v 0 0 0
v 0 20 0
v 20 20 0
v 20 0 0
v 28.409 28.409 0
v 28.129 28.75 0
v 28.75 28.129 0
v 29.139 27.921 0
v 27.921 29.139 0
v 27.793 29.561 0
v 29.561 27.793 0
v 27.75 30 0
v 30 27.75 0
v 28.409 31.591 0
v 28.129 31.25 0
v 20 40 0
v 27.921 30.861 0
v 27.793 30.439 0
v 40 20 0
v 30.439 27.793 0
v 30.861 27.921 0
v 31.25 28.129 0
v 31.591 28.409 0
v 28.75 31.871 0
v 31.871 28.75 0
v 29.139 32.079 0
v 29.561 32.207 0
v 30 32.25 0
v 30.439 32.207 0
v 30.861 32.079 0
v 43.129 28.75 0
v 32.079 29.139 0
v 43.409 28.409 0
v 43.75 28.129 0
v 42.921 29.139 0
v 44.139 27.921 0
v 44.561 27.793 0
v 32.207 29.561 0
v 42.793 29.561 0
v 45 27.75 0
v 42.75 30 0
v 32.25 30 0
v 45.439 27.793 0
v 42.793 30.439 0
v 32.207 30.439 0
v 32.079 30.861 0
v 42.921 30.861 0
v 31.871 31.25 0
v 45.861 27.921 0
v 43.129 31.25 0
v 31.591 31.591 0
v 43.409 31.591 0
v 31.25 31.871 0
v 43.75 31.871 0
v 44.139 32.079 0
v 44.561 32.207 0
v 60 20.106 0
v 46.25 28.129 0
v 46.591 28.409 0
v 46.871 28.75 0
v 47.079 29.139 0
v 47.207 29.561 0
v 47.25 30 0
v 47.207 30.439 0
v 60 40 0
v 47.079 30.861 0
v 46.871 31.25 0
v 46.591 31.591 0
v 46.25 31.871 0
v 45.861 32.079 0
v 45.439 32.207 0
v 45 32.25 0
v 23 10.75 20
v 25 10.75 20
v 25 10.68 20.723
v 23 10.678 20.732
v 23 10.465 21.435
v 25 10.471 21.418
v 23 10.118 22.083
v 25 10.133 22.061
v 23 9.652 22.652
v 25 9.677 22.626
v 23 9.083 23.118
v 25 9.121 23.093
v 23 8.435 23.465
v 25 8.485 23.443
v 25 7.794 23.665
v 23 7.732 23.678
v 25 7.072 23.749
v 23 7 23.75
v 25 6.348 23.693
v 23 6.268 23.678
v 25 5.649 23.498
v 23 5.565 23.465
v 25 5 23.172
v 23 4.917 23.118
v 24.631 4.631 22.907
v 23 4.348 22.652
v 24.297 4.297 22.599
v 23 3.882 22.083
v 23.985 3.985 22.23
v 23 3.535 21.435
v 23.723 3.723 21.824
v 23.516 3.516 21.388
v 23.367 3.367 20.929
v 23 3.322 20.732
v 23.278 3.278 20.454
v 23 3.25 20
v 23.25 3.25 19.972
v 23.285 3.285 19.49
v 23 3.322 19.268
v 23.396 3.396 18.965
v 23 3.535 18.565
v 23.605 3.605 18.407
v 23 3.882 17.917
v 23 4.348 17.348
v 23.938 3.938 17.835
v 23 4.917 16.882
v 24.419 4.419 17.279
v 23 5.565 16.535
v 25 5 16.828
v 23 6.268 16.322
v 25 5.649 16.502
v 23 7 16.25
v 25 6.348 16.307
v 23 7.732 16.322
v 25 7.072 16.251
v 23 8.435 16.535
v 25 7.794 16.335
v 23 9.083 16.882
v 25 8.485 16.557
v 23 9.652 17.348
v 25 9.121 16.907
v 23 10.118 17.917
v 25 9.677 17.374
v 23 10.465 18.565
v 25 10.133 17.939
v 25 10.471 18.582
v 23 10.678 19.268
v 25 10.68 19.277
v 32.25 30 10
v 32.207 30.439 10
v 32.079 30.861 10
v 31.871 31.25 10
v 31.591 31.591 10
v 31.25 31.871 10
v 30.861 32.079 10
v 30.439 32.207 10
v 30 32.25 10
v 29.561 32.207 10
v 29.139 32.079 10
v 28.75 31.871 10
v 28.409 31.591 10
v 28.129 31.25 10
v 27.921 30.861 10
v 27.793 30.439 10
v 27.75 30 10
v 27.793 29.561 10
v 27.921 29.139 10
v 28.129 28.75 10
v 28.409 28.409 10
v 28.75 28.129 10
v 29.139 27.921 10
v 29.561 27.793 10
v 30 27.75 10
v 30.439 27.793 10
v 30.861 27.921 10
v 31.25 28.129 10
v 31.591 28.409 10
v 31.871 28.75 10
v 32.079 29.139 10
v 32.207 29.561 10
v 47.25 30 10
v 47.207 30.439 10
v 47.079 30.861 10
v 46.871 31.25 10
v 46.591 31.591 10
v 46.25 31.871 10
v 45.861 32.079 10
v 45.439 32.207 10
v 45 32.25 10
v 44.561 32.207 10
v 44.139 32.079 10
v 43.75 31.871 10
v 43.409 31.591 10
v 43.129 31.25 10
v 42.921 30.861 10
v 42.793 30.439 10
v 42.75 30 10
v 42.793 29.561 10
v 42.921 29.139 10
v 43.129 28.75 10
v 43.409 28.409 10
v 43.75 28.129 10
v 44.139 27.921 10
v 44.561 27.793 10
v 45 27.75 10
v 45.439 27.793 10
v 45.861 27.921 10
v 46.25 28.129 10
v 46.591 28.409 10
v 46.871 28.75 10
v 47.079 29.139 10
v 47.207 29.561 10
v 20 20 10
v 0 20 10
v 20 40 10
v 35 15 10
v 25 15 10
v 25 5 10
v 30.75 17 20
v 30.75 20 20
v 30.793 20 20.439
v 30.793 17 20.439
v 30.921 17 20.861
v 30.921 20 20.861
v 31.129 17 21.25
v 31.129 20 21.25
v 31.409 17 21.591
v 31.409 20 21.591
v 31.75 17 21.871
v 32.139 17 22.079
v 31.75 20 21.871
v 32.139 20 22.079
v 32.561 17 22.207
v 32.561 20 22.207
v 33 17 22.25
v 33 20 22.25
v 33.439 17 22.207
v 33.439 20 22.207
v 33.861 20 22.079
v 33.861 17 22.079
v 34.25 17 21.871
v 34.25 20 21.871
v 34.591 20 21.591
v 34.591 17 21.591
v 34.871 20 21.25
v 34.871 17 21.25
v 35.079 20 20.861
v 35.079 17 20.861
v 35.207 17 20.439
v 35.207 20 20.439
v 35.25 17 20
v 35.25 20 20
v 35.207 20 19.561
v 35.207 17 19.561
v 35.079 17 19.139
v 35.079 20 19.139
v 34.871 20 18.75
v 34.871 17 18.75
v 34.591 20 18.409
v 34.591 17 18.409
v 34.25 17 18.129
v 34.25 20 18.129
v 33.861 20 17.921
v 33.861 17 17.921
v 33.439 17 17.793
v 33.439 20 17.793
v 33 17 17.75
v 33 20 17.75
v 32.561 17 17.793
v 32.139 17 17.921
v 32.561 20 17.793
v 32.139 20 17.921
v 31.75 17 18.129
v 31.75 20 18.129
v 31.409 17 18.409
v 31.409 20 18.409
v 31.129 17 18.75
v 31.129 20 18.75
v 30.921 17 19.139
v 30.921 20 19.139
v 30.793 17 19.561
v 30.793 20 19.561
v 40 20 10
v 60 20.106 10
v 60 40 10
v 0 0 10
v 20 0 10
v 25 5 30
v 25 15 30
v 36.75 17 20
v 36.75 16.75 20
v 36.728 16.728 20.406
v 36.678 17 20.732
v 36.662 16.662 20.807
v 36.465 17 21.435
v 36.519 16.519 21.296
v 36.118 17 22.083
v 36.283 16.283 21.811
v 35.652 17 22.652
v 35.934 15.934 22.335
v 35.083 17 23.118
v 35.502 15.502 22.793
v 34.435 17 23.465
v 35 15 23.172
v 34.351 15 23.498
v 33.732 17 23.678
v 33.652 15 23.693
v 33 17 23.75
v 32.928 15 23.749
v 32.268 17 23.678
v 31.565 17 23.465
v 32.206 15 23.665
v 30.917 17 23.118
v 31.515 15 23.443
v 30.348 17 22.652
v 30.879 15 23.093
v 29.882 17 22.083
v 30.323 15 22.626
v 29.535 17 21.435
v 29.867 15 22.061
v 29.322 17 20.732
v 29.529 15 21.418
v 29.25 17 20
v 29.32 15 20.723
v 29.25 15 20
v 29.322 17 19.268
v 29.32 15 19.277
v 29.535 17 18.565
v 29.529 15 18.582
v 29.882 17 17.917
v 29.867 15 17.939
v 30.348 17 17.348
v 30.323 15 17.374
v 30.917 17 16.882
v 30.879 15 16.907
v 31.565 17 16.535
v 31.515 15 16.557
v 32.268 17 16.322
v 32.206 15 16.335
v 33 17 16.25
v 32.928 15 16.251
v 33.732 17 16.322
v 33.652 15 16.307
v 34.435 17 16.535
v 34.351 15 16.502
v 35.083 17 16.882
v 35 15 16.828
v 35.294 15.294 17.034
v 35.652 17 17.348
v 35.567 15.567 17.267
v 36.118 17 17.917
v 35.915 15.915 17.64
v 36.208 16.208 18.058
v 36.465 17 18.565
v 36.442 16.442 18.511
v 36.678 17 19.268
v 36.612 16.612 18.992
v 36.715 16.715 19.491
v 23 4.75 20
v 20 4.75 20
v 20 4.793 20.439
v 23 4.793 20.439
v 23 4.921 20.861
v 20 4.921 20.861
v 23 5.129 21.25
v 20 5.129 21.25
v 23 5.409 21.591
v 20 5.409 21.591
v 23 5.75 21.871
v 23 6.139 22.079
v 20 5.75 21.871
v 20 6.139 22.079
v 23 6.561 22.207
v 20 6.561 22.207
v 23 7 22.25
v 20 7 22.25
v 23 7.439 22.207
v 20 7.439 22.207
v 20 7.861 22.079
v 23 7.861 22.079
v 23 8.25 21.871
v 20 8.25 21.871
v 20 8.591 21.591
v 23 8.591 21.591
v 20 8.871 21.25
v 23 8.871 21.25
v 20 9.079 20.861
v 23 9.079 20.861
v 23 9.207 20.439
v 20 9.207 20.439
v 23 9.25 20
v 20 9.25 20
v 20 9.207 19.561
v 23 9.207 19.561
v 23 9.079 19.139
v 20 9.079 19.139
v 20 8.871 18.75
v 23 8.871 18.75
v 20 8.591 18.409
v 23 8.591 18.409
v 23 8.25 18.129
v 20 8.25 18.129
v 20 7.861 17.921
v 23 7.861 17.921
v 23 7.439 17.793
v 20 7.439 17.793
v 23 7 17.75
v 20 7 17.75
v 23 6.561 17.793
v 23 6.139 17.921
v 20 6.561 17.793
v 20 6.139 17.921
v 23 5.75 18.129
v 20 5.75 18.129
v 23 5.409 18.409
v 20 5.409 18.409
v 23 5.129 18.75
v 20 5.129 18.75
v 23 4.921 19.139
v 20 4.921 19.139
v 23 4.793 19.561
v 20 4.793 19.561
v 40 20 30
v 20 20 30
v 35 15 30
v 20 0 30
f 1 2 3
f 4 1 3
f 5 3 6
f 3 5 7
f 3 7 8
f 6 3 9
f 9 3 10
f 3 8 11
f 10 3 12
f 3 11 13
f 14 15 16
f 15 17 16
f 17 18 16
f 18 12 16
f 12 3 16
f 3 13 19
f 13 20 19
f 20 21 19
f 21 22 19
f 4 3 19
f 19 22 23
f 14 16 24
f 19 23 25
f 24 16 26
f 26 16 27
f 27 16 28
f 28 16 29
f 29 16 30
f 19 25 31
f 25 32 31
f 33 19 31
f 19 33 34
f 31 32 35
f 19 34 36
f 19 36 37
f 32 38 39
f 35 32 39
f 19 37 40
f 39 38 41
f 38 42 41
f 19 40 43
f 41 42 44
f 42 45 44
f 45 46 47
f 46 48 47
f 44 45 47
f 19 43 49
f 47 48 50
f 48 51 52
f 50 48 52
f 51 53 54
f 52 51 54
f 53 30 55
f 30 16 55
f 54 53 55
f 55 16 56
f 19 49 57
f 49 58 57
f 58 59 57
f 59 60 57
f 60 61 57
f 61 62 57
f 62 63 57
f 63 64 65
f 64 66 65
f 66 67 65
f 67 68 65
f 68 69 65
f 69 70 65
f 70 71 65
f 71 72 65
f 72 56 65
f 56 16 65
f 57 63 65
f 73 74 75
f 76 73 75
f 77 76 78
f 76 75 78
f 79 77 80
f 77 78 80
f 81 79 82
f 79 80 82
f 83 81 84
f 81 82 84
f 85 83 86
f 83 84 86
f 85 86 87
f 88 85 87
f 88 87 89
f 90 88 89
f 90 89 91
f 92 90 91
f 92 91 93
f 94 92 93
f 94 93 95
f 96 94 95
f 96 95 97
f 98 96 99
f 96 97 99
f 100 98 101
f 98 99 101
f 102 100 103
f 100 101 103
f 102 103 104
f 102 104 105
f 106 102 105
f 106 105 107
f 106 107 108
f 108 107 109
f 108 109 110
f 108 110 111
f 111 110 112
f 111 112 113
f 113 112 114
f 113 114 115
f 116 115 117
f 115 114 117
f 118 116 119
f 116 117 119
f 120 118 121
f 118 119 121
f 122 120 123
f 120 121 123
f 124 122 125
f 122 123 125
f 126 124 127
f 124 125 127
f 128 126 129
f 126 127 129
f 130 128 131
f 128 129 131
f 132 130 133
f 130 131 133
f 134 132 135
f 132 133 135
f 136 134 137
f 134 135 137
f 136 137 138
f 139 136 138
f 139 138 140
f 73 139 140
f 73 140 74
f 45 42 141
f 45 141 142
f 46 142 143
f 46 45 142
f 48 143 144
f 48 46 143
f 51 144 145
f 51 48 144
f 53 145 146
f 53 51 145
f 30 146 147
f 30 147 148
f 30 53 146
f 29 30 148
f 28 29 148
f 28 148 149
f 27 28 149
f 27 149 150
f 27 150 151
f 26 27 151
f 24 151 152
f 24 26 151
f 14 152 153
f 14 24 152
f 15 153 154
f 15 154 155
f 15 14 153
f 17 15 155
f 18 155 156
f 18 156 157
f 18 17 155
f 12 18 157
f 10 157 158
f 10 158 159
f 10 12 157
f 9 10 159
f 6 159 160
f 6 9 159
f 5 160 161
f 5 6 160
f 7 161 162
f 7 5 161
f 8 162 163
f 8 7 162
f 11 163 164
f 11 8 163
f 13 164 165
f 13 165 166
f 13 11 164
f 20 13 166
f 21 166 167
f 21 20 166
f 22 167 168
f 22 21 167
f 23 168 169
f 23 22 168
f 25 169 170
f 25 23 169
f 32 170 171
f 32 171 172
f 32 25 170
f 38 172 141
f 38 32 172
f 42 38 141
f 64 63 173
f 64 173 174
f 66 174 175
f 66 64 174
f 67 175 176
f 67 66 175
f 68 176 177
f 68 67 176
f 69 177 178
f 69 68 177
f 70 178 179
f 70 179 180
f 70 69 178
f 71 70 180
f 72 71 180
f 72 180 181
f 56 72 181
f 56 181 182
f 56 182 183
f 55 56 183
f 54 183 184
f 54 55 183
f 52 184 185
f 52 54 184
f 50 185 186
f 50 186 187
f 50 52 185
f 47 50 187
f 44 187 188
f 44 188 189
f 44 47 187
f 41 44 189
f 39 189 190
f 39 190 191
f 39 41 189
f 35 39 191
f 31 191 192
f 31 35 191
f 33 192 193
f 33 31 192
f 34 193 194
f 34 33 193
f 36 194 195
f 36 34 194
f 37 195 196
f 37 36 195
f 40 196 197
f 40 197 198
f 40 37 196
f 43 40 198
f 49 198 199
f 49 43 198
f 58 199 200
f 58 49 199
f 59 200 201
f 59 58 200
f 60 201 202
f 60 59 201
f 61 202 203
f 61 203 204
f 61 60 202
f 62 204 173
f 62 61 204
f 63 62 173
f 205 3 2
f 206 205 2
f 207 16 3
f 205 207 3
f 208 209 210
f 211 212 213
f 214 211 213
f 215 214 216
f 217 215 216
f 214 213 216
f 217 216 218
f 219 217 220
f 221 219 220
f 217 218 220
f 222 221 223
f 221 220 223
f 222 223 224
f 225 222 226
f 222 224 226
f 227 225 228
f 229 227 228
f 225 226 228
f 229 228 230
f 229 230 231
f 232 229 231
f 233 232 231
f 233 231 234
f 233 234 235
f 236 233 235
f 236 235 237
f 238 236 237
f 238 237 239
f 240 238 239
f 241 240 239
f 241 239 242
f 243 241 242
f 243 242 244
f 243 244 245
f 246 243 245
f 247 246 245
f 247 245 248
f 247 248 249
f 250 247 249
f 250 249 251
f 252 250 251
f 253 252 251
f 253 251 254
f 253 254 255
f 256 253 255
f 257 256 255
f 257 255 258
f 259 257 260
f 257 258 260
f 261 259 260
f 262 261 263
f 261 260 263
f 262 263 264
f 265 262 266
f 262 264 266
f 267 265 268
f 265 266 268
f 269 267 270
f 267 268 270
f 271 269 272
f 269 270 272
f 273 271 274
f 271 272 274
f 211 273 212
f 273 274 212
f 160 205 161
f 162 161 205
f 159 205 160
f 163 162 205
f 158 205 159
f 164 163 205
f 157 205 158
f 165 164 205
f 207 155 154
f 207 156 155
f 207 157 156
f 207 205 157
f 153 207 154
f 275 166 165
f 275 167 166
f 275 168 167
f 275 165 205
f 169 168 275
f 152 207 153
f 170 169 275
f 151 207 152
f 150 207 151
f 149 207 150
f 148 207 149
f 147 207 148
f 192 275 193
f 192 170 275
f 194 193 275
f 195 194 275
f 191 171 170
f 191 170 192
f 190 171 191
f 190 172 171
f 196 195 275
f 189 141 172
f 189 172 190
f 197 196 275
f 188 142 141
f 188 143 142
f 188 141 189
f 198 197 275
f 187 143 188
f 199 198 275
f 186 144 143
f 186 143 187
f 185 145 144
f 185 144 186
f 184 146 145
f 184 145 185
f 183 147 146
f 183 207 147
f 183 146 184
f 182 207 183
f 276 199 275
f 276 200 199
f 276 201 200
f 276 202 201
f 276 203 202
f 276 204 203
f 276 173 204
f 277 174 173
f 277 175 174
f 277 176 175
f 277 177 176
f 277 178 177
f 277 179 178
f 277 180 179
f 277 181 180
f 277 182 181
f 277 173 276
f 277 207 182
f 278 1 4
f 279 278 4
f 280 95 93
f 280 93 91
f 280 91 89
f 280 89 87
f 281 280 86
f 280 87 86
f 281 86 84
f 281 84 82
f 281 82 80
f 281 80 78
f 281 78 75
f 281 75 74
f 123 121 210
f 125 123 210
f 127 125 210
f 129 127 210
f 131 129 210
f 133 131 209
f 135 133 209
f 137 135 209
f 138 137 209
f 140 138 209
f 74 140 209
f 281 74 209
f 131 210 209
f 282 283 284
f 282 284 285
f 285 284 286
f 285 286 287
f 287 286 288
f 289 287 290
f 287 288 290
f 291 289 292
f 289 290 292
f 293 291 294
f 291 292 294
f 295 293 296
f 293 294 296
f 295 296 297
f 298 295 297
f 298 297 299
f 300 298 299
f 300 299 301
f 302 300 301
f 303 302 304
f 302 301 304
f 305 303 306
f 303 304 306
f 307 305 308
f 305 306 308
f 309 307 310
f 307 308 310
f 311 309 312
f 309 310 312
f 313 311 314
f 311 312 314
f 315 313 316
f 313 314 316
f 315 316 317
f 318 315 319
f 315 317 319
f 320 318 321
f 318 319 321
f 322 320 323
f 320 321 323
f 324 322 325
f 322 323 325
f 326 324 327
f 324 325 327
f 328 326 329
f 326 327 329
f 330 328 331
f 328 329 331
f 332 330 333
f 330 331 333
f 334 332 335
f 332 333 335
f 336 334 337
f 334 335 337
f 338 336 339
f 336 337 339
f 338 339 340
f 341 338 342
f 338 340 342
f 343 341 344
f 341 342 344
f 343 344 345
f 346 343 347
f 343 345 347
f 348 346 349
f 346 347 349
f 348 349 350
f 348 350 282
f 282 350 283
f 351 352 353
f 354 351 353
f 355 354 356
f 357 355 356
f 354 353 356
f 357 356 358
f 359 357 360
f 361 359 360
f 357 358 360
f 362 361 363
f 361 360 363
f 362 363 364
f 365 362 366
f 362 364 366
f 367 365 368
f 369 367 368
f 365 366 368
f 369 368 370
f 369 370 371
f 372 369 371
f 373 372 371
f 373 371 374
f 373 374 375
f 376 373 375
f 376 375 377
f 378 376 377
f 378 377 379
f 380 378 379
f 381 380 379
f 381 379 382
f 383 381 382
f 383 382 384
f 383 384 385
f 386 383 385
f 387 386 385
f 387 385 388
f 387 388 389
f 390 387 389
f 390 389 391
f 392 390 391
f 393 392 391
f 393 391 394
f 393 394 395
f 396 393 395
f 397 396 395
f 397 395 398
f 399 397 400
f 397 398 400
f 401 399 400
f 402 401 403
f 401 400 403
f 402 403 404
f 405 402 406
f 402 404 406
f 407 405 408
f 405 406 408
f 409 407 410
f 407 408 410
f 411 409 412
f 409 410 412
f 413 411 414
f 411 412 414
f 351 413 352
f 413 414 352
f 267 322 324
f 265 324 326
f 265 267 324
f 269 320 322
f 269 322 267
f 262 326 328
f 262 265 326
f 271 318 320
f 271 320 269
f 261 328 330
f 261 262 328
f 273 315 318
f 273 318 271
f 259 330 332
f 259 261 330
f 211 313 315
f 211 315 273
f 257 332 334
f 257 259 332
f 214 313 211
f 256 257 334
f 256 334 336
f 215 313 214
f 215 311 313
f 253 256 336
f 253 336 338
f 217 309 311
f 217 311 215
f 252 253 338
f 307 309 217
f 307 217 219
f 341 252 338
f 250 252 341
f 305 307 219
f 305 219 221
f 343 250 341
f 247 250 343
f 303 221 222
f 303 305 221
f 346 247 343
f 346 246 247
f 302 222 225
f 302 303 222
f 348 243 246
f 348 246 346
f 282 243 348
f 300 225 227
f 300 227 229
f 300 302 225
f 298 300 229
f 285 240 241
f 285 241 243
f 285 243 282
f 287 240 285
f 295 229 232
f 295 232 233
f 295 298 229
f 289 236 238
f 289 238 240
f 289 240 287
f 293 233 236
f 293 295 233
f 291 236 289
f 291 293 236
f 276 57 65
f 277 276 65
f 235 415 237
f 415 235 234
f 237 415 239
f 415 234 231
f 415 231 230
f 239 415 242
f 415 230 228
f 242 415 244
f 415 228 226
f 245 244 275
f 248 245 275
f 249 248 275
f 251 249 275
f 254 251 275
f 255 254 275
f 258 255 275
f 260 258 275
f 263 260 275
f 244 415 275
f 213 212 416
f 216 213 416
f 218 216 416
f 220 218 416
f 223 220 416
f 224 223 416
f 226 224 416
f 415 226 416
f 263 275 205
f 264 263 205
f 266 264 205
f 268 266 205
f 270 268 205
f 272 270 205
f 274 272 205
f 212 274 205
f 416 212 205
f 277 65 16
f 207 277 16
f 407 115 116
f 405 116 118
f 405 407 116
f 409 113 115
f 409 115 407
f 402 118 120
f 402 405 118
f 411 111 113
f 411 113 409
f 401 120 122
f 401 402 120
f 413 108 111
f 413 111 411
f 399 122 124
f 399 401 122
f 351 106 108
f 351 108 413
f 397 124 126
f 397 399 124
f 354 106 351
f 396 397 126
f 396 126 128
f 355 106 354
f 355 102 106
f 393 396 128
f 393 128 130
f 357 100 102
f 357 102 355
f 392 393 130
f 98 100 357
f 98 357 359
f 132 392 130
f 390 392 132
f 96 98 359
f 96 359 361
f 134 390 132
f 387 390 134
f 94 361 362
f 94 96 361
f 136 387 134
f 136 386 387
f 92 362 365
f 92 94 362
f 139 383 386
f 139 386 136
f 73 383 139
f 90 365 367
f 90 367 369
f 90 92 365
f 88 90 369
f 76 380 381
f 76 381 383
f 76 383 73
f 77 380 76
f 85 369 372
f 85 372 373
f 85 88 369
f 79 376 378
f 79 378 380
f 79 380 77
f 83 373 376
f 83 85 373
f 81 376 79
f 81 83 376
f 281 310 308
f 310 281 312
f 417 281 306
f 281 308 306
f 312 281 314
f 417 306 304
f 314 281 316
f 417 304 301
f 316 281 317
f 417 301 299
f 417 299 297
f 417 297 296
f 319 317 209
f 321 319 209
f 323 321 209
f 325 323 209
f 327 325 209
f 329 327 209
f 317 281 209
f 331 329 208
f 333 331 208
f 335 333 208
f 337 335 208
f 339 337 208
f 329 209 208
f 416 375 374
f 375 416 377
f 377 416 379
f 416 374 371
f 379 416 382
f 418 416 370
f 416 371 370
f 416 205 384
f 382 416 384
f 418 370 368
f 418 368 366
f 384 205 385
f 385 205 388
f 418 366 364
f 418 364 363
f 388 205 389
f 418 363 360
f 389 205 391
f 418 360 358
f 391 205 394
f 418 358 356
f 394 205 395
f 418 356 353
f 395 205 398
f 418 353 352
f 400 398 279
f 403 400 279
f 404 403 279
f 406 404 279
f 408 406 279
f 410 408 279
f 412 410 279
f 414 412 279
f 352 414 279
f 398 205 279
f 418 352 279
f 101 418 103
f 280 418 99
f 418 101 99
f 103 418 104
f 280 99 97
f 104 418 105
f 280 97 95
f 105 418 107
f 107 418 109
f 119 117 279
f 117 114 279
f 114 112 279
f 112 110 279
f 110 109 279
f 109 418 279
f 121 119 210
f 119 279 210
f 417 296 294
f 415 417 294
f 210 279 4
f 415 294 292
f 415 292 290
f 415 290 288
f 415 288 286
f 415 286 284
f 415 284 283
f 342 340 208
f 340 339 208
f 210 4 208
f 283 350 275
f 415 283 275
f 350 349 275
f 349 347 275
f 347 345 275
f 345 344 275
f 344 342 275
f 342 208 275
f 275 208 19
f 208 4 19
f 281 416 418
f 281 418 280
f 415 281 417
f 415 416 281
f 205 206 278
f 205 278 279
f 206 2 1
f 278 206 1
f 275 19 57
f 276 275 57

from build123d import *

# Parameters (mm, degrees)
F0_R      = 2.25
F1_DEPTH  = 10
F3_DEPTH  = 20
F4_R      = 2.25
F5_DEPTH  = 5
F6_R      = 2.25
F7_DEPTH  = 5
F8_R      = 3.75
F9_DEPTH  = 2
F10_R     = 3.75
F11_DEPTH = 2


with BuildPart() as f1:
    # F0 (on Top) → F1 (new body)
    with BuildSketch(Plane.XY):
        Polygon((20, 20), (0, 20), (0, 0), (20, 0), (40, 20), (60, 20.106066), (60, 40), (20, 40), align=None)
        with Locations((30, 30)):
            Circle(F0_R, mode=Mode.SUBTRACT)
        with Locations((45, 30)):
            Circle(F0_R, mode=Mode.SUBTRACT)
    extrude(amount=F1_DEPTH)

    # F2 (on face) → F3 (join)
    with BuildSketch(Plane.XY.offset(10)):
        Polygon((40, 20), (20, 20), (20, 0), (25, 5), (25, 10), (25, 15), (30, 15), (35, 15), align=None)
    extrude(amount=F3_DEPTH)

    # F4 (on face) → F5 (cut)
    with BuildSketch(Plane(origin=(20, 0, 0), x_dir=(0, -1, 0), z_dir=(-1, 0, 0))):
        with Locations((-7, 20)):
            Circle(F4_R)
    extrude(amount=-F5_DEPTH, mode=Mode.SUBTRACT)

    # F6 (on face) → F7 (cut)
    with BuildSketch(Plane(origin=(0, 20, 0), x_dir=(-1, 0, 0), z_dir=(0, 1, 0))):
        with Locations((-33, 20)):
            Circle(F6_R)
    extrude(amount=-F7_DEPTH, mode=Mode.SUBTRACT)

    # F8 (on face) → F9 (cut)
    with BuildSketch(Plane.XZ.offset(-15)):
        with Locations((33, 20)):
            Circle(F8_R)
    extrude(amount=-F9_DEPTH, mode=Mode.SUBTRACT)

    # F10 (on face) → F11 (cut)
    with BuildSketch(Plane.YZ.offset(25)):
        with Locations((7, 20)):
            Circle(F10_R)
    extrude(amount=-F11_DEPTH, mode=Mode.SUBTRACT)


solid = f1.part
